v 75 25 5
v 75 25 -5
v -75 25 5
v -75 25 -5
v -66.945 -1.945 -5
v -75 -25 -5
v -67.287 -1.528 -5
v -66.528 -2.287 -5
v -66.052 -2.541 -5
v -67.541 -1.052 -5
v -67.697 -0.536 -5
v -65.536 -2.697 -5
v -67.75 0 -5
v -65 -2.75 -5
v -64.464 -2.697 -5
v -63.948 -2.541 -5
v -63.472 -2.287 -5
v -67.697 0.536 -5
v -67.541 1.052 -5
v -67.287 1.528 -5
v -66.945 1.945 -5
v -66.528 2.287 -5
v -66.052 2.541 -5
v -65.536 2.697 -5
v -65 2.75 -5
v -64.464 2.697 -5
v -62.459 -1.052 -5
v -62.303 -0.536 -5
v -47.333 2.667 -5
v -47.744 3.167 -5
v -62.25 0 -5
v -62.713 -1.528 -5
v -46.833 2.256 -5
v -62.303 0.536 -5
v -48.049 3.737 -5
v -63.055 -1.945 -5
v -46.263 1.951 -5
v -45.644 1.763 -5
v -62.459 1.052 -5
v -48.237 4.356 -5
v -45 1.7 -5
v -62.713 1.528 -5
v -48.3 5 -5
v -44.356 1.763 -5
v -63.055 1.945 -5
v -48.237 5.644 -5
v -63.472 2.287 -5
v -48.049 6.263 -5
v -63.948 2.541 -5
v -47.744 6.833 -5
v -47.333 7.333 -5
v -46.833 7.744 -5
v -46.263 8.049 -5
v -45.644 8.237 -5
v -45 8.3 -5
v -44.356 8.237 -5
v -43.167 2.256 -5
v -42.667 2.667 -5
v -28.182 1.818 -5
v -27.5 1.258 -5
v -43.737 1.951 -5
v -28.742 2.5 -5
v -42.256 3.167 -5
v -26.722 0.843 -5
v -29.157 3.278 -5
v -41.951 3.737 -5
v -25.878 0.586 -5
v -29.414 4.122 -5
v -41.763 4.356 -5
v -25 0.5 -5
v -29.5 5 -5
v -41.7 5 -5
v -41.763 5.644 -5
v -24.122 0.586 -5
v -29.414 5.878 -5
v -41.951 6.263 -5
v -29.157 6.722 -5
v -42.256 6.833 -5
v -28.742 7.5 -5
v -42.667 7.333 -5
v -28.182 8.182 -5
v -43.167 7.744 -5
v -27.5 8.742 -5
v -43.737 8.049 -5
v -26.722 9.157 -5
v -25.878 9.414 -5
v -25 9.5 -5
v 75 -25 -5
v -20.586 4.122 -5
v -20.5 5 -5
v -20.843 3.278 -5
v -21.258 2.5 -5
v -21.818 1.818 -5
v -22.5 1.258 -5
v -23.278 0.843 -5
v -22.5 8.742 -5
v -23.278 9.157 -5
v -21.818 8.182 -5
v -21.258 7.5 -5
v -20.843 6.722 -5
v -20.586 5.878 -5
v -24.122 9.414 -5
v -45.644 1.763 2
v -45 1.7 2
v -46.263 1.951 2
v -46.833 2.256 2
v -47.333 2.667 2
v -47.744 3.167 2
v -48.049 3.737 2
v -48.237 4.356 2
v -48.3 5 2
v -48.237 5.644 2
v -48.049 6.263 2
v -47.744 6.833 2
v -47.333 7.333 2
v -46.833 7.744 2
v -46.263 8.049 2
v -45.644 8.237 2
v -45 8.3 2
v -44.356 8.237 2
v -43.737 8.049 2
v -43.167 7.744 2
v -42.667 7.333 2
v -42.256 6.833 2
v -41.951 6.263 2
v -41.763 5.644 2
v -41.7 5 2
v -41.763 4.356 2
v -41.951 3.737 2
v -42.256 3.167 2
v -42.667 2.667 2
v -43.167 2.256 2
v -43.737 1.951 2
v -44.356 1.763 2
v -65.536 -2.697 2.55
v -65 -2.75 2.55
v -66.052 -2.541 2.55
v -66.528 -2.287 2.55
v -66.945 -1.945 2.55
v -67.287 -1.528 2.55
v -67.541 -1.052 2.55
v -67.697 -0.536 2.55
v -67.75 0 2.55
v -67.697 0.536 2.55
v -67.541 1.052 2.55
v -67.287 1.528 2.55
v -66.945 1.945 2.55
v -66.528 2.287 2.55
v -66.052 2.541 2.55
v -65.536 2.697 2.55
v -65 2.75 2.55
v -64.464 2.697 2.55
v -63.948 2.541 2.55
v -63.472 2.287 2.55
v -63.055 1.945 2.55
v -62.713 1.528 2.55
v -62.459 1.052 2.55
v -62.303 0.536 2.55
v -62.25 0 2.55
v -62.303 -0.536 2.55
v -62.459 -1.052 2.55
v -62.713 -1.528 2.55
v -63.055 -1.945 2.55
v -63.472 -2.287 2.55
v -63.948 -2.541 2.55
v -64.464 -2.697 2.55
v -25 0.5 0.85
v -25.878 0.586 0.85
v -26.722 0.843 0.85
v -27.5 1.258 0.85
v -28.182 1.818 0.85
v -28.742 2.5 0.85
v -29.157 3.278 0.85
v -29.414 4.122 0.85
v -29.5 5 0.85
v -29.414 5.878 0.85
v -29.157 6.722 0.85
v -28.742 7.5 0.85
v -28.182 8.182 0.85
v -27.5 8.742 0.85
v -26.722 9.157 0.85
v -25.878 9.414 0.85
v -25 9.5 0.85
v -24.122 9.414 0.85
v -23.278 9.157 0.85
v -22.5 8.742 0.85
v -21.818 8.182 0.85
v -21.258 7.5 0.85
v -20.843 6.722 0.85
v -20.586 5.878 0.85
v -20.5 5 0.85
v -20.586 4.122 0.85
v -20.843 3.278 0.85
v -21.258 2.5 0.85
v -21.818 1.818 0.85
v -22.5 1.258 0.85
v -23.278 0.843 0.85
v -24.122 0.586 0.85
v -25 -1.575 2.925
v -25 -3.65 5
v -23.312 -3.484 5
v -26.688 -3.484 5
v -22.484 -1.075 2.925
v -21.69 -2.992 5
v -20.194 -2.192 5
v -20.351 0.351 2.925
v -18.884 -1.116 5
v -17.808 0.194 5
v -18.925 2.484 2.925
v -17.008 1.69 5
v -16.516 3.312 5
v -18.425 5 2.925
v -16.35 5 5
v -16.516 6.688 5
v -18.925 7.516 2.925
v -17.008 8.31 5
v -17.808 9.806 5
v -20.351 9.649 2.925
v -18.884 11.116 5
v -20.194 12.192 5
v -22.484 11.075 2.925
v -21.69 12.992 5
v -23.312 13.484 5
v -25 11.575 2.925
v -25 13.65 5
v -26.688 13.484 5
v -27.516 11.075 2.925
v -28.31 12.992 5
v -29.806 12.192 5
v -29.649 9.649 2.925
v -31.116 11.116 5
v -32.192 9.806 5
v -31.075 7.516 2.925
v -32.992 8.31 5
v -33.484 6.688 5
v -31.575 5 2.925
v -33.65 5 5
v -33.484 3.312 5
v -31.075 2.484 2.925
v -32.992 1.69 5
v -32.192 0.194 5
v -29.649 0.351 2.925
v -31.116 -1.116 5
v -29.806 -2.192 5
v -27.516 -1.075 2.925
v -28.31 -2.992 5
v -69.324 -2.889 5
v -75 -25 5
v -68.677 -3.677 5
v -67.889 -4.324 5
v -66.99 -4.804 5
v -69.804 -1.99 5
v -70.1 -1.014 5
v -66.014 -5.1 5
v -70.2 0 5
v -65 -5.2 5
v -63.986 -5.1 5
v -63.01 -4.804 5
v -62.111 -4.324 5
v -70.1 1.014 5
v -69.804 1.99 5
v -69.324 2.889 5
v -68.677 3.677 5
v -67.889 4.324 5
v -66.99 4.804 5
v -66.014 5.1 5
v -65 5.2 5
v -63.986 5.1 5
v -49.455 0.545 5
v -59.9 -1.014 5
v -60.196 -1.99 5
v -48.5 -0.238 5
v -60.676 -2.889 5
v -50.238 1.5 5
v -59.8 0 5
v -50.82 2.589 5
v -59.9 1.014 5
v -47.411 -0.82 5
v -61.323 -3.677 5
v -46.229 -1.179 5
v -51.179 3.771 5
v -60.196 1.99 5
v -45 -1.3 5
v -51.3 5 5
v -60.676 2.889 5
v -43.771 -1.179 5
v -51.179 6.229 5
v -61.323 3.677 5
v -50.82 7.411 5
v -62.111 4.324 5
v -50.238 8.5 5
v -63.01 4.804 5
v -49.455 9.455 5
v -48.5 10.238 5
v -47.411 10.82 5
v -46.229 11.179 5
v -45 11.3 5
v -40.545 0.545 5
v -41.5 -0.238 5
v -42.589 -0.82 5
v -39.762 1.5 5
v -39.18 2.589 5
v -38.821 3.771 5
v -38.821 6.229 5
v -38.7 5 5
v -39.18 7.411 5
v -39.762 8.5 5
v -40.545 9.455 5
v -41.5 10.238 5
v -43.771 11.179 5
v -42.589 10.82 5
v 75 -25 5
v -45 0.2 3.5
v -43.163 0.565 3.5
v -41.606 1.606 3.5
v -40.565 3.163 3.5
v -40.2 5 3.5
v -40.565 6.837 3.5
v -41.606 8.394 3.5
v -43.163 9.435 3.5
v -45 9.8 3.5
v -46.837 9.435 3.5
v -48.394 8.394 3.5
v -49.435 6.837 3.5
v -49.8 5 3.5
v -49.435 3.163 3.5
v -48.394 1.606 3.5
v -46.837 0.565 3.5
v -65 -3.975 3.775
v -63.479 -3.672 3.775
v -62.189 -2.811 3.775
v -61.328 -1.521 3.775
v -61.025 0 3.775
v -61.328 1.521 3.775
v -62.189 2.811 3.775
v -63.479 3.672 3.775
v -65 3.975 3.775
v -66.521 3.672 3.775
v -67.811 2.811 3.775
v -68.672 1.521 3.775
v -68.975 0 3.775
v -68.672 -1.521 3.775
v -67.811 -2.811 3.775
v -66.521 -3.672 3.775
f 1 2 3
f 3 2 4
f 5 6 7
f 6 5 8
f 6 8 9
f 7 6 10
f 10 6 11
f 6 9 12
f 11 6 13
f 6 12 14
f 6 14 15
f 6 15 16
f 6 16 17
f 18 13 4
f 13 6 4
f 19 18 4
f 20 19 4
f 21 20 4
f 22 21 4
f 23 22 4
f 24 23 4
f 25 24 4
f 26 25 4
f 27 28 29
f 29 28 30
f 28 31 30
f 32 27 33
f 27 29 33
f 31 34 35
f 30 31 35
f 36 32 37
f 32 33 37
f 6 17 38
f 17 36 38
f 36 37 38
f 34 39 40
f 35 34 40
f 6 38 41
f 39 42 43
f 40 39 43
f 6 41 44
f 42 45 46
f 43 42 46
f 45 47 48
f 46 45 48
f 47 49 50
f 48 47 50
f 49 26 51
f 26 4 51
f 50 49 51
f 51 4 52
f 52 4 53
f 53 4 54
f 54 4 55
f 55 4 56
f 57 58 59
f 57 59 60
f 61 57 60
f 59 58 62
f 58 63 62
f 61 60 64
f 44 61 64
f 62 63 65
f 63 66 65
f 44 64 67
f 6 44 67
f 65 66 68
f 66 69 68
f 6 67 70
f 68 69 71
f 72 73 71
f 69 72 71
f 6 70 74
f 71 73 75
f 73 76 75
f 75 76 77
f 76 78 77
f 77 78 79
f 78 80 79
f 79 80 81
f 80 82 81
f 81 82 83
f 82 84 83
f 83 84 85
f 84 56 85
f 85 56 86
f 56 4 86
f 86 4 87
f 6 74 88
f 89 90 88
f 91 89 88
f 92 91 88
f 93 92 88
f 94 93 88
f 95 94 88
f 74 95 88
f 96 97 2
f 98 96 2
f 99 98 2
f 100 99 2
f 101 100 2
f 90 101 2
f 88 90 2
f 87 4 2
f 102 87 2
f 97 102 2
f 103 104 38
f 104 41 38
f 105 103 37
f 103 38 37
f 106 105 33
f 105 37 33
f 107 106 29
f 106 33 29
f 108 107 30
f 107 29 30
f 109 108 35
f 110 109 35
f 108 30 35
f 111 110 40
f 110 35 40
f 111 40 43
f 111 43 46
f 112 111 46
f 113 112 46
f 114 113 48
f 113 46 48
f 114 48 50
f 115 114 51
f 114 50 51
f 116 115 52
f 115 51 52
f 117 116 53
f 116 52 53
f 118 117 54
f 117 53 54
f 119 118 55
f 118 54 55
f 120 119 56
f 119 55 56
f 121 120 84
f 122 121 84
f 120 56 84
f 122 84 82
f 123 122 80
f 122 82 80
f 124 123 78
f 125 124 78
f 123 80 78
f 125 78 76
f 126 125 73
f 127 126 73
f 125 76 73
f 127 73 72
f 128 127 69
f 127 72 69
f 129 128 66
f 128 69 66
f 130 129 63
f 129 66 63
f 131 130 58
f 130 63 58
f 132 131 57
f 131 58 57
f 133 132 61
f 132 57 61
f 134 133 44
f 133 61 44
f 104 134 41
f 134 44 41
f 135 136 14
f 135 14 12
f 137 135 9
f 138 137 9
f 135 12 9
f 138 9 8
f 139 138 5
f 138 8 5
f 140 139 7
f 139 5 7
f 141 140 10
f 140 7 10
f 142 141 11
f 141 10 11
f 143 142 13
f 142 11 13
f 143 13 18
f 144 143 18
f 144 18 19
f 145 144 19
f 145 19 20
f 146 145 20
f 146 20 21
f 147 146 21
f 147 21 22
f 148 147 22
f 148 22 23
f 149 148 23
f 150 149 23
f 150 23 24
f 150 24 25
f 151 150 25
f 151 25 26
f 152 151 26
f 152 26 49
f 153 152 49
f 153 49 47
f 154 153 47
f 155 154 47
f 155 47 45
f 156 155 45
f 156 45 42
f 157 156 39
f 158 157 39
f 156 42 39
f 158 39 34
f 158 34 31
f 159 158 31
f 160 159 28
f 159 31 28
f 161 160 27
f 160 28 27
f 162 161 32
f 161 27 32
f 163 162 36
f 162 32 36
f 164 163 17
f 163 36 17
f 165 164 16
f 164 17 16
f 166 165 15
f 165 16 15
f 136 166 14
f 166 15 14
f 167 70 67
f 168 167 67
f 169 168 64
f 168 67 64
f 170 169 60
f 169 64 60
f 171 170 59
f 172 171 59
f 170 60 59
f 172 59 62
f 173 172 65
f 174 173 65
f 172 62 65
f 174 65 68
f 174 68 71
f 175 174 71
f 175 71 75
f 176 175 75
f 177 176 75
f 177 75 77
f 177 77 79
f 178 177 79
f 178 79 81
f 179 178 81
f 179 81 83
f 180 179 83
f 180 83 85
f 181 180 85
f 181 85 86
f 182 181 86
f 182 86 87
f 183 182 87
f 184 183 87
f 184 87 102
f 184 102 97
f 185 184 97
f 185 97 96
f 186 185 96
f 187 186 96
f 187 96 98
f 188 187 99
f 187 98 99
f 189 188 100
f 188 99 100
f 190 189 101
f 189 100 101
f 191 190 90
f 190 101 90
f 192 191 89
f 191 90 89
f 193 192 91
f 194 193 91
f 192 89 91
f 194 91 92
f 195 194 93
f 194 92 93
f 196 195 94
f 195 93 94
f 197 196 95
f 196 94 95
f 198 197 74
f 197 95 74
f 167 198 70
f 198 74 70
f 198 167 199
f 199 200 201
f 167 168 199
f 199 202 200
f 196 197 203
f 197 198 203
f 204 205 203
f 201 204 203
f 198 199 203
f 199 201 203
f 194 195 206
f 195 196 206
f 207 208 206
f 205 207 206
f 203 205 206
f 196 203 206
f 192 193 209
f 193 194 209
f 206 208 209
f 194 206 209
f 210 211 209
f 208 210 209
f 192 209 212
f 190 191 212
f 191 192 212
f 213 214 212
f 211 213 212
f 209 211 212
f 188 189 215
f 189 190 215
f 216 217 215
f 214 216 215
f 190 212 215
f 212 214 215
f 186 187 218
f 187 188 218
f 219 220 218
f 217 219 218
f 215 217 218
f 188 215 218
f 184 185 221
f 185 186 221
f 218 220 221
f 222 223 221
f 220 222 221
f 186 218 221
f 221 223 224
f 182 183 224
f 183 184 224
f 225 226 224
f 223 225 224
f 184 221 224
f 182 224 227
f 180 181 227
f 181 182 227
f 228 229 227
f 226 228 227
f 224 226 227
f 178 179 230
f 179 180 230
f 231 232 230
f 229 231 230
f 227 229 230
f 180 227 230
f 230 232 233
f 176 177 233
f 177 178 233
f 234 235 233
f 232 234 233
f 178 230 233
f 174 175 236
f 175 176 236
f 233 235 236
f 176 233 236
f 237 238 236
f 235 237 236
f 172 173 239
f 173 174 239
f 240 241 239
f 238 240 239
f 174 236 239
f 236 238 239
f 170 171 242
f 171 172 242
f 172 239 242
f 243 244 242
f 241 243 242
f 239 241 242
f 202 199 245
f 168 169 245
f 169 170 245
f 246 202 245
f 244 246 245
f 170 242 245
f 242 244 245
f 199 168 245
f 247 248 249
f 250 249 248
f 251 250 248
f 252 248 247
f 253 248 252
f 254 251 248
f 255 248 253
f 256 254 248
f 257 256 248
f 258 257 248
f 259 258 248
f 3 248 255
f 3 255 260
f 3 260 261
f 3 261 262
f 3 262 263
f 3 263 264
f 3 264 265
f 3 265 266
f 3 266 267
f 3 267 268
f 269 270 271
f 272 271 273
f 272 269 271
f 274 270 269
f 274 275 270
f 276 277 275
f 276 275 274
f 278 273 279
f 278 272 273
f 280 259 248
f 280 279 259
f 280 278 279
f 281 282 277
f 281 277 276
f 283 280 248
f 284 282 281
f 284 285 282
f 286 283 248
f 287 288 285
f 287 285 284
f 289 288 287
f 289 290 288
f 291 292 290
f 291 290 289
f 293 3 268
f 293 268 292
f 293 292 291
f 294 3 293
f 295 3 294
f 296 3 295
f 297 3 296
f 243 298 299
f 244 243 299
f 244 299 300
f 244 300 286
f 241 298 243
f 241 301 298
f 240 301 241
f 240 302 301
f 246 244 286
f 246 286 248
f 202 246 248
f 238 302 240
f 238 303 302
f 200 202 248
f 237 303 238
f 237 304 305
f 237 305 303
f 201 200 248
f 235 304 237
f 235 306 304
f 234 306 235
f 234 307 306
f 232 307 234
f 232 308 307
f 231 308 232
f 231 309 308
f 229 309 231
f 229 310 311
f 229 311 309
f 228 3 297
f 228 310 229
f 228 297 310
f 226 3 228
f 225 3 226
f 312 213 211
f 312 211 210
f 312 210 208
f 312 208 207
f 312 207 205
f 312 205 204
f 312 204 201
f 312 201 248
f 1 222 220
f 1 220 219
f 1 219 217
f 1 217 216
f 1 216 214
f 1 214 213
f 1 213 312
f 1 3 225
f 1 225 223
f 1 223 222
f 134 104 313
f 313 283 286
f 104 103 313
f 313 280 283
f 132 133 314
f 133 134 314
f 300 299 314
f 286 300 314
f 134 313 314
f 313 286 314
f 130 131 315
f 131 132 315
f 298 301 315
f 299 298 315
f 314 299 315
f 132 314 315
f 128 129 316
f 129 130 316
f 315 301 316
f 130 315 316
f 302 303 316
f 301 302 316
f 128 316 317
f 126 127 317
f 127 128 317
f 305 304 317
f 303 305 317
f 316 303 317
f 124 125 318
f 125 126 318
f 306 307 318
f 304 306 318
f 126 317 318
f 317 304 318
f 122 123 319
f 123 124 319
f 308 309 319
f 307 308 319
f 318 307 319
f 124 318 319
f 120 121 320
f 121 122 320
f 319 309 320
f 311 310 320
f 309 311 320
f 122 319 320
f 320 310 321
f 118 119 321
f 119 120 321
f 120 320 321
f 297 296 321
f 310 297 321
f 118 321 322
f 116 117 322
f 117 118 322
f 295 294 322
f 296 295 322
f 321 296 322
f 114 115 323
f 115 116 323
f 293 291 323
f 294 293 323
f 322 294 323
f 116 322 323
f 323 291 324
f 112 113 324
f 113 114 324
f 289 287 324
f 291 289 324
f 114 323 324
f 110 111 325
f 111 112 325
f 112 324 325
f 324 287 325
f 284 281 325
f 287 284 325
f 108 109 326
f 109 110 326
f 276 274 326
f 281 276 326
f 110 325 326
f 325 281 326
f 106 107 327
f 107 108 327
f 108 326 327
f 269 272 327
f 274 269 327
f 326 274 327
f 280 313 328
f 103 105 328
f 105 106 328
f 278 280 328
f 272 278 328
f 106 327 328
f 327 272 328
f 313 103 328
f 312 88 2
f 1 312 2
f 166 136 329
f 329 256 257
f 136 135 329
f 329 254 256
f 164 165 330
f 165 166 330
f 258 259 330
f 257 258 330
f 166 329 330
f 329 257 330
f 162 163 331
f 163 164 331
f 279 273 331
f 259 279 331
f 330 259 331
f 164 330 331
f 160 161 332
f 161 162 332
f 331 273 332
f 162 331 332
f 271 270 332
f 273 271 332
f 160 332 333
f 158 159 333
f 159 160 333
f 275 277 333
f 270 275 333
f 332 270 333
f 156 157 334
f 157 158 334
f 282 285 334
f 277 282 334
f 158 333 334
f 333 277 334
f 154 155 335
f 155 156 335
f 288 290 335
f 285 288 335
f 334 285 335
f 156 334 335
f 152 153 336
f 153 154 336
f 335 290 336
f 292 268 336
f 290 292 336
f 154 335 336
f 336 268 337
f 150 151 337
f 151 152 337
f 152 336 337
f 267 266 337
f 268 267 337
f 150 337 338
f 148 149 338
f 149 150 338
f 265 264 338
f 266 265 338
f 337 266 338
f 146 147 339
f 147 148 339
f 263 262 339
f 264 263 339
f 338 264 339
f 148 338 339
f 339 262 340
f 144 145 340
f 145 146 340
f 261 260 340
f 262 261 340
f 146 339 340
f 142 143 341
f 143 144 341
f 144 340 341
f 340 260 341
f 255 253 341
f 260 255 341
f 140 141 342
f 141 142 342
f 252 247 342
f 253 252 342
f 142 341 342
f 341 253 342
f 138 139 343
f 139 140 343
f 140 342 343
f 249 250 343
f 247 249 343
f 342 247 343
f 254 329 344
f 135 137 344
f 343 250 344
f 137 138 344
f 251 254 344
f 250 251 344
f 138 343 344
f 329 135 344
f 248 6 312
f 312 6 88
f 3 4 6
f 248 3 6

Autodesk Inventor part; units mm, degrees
ref_plane "YZ Plane" through (0, 0, 0) normal (1, 0, 0) x (0, 1, 0)
ref_plane "XZ Plane" through (0, 0, 0) normal (0, 1, 0) x (-1, 0, 0)
ref_plane "XY Plane" through (0, 0, 0) normal (0, 0, 1) x (1, 0, 0)
sketch "Sketch2" plane through (0, 0, 0) normal (0, 0, 1) x (1, 0, 0)
  line L0 (-75, -25) -> (75, -25)
  line L1 (75, -25) -> (75, 25)
  line L2 (75, 25) -> (-75, 25)
  line L3 (-75, 25) -> (-75, -25)
  line L4 (-75, -25) -> (75, 25) construction
  line L5 (75, -25) -> (-75, 25) construction
  point P0 (0, 0)
  dimension "d1" = 150
  dimension "d2" = 50
extrude "Extrusion1" add sketch "Sketch2" along normal mid plane 10
sketch "Sketch3" plane through (0, 0, 5) normal (0, 0, 1) x (1, 0, 0)
  line L0 (-75, 25) -> (-75, -25) projected
  line L1 (75, 25) -> (-75, 25) projected
  point P0 (0, 0)
  point P1 (-65, 0)
  dimension "d40" = 10
  dimension "d43" = 25
hole "Hole1" at (-65, 0, 5) direction (0, 0, -1) diameter 5.5 depth 14.2 tip angle 118 countersink diameter 10.4 countersink angle 90 clearance for "Counter Sink" size "M5" standard "TS Profile"
sketch "Sketch4" plane through (0, 0, 5) normal (0, 0, 1) x (1, 0, 0)
  line L0 (-75, 25) -> (-75, -25) projected
  line L1 (75, 25) -> (-75, 25) projected
  point P0 (0, 0)
  point P1 (-45, 5)
  dimension "d41" = 30
  dimension "d42" = 20
hole "Hole2" at (-45, 5, 5) direction (0, 0, -1) diameter 6.6 depth 14.2 tip angle 118 countersink diameter 12.6 countersink angle 90 clearance for "Counter Sink" size "M6" standard "TS Profile"
sketch "Sketch5" plane through (0, 0, 5) normal (0, 0, 1) x (1, 0, 0)
  line L0 (-75, 25) -> (-75, -25) projected
  line L1 (75, 25) -> (-75, 25) projected
  point P0 (0, 0)
  point P1 (-25, 5)
  dimension "d44" = 50
  dimension "d45" = 20
hole "Hole3" at (-25, 5, 5) direction (0, 0, -1) diameter 9 depth 14.2 tip angle 118 countersink diameter 17.3 countersink angle 90 clearance for "Counter Sink" size "M8" standard "TS Profile"
properties part number "홀간 거리 확인 파트-10" material "SS400"
